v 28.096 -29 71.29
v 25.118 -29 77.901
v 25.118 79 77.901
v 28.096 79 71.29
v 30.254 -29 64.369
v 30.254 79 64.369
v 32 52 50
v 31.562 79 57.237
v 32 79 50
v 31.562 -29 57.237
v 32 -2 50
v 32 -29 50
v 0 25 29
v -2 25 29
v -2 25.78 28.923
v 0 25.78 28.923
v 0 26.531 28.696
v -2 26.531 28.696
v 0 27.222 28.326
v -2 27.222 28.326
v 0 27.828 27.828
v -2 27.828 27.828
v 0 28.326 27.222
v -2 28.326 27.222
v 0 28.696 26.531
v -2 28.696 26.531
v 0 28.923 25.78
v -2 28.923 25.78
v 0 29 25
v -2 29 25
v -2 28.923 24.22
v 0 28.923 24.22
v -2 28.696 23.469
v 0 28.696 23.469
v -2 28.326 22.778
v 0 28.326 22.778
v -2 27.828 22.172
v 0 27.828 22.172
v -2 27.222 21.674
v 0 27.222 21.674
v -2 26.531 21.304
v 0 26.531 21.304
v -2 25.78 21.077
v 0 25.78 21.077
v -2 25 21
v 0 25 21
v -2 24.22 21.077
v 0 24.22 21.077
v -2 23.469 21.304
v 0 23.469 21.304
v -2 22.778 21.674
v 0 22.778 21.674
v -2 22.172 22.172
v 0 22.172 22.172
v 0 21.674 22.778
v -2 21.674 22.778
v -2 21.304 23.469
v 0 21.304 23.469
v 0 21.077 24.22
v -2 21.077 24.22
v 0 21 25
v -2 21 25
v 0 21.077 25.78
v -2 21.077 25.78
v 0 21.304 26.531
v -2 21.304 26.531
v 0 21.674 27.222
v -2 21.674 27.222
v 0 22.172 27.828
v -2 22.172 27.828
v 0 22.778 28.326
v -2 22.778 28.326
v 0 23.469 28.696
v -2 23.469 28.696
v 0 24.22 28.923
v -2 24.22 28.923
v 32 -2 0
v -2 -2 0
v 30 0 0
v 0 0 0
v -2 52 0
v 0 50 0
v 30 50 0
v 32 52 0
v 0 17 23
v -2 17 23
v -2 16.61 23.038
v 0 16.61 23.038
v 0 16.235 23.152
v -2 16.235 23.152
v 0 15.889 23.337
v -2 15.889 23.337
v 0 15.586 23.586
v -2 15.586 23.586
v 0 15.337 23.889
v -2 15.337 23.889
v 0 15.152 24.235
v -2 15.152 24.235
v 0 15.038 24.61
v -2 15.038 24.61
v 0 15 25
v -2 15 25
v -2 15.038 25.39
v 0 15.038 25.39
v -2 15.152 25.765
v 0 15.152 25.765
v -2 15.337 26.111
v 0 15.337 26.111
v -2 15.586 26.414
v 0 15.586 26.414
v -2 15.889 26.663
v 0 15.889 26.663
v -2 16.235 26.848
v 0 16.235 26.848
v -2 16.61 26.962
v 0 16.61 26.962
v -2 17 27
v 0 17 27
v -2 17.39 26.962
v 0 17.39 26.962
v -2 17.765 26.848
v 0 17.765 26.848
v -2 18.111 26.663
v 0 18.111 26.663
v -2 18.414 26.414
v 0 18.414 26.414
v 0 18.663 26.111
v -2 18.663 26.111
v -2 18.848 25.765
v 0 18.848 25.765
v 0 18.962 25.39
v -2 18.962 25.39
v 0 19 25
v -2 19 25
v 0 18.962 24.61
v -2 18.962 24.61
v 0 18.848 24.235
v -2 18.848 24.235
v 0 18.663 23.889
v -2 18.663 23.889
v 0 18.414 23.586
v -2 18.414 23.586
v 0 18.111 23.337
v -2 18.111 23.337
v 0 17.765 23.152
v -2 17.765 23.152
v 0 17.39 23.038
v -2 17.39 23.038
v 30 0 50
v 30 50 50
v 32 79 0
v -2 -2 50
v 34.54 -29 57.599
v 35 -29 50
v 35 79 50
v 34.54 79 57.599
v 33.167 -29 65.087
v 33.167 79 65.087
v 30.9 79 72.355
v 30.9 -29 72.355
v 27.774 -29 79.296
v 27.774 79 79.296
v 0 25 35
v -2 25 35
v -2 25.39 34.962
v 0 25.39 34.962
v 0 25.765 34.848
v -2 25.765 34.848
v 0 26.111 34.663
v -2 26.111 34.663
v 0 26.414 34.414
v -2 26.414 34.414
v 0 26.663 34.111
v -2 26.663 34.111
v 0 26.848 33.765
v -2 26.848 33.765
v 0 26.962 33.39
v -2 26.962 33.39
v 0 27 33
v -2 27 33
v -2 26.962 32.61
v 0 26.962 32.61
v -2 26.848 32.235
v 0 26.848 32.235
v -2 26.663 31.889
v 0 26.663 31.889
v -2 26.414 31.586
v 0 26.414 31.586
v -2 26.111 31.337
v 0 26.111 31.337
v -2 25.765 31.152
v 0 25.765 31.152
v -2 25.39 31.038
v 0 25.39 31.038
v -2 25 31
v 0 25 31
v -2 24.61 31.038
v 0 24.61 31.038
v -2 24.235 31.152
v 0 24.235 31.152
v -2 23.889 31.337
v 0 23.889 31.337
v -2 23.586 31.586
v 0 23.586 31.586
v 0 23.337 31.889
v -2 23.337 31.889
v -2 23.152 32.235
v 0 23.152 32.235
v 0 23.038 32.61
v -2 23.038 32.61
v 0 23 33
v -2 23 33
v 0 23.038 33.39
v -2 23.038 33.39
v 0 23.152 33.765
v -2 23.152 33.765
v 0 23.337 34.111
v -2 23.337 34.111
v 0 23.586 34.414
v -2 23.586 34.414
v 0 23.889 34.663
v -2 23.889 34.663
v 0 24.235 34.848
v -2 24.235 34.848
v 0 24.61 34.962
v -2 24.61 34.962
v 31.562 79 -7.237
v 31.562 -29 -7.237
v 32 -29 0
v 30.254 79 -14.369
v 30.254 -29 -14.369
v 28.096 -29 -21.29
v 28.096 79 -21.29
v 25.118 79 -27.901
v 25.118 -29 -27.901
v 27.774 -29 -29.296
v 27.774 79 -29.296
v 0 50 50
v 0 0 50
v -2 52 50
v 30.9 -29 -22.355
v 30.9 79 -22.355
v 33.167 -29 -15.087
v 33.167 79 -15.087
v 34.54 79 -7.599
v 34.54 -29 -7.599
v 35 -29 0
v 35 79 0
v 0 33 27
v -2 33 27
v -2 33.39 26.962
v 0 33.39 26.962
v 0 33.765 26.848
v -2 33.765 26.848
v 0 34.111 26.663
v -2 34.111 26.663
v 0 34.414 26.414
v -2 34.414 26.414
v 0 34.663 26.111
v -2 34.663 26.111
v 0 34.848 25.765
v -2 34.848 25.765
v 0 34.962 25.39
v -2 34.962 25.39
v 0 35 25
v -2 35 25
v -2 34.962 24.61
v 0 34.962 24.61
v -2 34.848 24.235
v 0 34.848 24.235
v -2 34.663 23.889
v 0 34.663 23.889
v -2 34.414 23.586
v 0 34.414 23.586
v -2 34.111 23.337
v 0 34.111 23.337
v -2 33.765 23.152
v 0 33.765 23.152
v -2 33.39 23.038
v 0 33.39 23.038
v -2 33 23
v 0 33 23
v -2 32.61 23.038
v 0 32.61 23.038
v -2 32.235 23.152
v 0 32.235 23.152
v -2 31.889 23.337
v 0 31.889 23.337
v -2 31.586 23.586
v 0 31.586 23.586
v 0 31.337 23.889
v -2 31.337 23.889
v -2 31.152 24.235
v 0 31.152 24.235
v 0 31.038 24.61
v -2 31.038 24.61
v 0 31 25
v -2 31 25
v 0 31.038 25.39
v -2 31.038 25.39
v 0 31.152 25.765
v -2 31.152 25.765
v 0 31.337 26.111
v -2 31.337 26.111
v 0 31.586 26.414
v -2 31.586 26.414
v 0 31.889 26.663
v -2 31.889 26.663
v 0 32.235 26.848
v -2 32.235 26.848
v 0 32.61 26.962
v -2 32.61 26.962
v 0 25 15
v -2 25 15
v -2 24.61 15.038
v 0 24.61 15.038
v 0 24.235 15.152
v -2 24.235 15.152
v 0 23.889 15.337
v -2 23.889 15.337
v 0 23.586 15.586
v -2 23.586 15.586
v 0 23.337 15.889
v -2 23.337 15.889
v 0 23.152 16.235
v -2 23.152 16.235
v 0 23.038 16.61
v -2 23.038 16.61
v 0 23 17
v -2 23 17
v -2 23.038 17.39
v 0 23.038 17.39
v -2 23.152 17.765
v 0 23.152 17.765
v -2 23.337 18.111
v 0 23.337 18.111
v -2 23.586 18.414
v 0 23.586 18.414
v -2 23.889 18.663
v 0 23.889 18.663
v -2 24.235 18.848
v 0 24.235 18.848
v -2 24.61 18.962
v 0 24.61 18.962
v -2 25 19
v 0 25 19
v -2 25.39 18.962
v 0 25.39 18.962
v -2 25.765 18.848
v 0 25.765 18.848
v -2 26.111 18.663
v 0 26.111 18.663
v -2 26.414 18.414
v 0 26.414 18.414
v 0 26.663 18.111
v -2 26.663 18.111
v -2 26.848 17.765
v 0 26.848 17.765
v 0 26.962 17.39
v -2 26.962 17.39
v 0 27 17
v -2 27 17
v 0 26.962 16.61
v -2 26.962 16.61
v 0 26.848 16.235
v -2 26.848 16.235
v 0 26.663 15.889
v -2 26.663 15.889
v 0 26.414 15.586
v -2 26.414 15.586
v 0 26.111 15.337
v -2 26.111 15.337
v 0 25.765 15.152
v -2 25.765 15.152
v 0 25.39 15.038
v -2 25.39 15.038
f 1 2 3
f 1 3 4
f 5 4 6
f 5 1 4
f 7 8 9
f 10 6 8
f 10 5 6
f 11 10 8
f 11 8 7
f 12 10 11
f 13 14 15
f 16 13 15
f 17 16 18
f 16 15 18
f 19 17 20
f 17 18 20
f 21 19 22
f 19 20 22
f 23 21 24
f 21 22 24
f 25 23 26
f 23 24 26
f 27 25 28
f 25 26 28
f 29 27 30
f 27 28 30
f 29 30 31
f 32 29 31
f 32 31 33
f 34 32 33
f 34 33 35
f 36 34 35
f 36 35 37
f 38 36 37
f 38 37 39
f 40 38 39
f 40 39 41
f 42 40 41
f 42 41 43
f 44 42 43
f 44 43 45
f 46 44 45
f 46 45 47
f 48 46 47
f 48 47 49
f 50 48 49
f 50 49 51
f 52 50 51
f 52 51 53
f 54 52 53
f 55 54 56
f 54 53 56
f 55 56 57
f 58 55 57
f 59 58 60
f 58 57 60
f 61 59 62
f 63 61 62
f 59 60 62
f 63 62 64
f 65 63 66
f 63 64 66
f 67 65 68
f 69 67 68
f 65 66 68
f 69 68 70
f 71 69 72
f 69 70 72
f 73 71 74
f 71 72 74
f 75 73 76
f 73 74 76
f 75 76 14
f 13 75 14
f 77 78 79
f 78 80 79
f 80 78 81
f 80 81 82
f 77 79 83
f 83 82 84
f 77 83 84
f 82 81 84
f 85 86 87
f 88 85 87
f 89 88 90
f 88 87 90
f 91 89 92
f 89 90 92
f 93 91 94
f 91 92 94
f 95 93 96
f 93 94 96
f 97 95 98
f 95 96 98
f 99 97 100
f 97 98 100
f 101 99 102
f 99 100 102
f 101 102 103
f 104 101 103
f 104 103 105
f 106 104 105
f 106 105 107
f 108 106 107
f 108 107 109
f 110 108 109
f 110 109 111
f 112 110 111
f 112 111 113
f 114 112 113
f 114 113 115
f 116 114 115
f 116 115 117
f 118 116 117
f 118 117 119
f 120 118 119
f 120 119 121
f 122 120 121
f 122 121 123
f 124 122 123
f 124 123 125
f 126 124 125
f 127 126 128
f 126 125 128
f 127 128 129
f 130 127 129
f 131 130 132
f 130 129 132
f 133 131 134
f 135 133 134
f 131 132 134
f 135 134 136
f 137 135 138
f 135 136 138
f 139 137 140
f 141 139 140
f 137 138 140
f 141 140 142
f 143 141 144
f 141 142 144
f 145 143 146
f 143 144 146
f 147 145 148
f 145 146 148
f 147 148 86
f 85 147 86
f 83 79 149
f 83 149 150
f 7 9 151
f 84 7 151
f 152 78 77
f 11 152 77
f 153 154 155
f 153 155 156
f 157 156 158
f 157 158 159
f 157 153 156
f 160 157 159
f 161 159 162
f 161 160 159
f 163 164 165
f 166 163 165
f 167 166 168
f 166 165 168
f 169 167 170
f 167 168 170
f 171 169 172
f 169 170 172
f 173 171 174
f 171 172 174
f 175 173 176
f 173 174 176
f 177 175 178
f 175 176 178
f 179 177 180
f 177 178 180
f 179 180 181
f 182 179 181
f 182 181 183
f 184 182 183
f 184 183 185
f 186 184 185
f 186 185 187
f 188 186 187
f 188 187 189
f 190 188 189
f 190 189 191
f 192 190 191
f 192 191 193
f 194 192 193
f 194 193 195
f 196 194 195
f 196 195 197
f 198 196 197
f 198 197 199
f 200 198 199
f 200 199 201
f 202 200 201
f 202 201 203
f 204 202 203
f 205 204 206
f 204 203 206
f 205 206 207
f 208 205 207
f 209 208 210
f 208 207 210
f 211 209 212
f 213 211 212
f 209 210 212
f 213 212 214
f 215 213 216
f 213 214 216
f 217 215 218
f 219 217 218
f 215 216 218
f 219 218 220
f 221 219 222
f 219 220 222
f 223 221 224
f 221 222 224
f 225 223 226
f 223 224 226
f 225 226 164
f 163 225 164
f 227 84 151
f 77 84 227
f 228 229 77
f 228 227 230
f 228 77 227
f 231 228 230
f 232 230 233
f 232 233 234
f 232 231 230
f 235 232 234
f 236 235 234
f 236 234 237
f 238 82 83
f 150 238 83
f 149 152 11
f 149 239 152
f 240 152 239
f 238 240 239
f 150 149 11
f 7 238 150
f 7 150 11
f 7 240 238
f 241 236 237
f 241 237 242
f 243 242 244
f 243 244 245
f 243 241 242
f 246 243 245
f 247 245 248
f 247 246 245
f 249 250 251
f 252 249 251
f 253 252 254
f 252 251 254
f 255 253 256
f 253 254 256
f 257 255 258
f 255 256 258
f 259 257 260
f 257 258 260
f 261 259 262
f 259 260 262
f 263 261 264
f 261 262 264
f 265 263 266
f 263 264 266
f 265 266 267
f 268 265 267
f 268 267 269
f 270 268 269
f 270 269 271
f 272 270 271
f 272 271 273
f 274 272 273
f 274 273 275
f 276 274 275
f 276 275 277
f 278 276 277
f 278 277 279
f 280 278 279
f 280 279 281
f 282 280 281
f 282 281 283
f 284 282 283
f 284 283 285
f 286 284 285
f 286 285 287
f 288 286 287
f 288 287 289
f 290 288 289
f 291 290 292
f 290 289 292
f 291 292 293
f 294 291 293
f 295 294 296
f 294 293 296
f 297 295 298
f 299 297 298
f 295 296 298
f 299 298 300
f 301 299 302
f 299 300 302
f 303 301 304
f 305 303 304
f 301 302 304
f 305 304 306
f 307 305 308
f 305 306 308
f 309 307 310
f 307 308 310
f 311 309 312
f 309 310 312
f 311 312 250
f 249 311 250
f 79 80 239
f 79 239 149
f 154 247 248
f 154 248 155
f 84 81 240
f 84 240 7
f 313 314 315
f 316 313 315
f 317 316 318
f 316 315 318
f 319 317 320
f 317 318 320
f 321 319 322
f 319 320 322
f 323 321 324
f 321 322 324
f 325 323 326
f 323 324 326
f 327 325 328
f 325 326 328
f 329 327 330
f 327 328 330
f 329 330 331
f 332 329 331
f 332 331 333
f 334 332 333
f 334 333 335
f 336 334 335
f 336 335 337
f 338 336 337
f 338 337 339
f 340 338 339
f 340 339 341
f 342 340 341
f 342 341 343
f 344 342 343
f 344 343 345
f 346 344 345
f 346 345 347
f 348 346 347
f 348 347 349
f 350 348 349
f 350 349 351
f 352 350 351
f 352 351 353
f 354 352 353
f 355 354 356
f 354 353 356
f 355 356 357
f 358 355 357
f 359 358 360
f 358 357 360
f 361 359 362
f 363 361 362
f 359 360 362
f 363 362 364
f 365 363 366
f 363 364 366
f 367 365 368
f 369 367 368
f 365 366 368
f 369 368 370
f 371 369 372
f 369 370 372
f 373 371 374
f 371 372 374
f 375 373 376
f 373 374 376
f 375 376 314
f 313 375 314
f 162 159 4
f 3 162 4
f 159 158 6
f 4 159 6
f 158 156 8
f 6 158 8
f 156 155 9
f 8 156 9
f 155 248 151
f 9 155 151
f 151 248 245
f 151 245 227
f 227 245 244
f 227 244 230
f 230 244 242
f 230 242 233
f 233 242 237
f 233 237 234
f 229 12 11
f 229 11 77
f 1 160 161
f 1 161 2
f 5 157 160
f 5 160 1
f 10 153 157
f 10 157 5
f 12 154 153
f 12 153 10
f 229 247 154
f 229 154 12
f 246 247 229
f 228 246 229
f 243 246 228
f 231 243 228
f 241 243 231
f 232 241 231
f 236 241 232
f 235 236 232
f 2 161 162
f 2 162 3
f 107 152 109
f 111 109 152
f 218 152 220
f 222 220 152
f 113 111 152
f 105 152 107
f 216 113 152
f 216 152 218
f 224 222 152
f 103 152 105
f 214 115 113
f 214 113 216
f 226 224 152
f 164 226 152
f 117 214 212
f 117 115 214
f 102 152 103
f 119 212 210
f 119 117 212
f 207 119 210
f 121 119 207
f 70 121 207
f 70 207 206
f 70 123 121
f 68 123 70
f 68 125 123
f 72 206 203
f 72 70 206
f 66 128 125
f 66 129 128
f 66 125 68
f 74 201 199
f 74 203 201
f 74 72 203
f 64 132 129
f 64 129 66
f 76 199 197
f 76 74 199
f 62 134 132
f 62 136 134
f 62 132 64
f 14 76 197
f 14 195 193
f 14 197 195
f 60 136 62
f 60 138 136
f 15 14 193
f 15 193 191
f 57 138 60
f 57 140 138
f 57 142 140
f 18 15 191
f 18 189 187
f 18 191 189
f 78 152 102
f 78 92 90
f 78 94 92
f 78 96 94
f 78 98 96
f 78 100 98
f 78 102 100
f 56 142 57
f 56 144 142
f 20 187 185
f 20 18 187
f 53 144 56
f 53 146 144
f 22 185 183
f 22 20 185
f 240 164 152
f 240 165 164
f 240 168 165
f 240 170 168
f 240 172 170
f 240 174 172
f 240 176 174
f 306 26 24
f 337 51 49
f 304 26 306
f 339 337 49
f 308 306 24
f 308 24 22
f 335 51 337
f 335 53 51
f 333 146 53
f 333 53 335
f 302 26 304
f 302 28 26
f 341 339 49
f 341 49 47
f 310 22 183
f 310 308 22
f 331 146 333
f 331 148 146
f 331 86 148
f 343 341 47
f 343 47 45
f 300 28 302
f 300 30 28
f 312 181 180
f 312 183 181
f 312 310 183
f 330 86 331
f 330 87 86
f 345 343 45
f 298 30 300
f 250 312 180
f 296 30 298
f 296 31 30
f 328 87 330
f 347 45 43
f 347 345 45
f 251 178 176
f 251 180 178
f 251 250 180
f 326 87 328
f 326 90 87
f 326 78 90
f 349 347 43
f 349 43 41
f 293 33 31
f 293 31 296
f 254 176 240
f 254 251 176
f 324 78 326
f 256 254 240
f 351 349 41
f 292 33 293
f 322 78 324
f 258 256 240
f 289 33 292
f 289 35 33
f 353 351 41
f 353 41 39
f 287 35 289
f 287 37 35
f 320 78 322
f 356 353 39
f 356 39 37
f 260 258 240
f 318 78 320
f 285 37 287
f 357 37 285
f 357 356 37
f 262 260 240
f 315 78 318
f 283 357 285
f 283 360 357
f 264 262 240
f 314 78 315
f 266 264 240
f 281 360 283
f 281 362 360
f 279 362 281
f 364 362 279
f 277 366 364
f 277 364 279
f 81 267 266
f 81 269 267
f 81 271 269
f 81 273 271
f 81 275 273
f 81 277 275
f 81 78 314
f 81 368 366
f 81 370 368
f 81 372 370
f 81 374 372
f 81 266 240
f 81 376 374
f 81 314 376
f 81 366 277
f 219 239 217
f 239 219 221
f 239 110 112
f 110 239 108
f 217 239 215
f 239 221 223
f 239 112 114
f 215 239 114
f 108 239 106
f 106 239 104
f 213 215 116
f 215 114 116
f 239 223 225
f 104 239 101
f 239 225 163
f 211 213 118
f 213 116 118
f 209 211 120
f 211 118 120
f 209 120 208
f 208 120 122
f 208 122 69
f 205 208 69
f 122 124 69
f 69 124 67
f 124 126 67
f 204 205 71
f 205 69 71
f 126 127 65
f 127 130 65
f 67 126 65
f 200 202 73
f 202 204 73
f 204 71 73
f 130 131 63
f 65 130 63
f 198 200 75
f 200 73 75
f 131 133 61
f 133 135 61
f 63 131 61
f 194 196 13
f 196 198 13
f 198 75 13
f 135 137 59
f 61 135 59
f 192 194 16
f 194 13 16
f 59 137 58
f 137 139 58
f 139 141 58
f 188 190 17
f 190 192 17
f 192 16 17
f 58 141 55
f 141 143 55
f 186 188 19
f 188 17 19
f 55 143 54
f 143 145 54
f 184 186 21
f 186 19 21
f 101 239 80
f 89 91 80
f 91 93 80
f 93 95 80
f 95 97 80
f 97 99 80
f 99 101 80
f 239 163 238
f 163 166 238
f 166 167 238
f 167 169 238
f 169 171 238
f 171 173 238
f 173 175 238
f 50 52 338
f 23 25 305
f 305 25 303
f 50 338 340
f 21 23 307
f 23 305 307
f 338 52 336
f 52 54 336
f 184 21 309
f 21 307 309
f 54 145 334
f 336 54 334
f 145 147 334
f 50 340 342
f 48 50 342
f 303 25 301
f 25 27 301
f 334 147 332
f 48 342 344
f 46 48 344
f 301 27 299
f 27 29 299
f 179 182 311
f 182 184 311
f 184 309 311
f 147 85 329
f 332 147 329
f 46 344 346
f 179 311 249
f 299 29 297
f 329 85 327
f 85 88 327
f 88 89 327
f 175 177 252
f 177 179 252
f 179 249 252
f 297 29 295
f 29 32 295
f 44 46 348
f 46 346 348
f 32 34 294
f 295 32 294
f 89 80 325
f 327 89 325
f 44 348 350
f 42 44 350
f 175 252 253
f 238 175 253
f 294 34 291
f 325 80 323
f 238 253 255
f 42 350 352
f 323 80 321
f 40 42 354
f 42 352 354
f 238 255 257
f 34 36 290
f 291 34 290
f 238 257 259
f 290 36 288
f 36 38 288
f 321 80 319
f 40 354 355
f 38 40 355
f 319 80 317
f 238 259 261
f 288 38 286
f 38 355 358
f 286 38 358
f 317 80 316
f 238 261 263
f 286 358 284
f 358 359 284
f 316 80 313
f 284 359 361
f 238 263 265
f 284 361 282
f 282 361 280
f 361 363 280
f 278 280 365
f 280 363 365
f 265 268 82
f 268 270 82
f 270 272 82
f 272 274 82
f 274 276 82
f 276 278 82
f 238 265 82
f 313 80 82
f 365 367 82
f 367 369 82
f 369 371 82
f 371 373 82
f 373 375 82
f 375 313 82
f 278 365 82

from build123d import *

# Parameters (mm, degrees)
IZIM1_W               = 34
IZIM1_H               = 54
IZIM1_W_2             = 30
IZIM1_H_2             = 50
EKSTR_ZYON_NCE1_DEPTH = 50
KES_EKSTR_ZYON1_REACH = 81.75
IZIM2_R               = 4
IZIM2_R_2             = 2
EKSTR_ZYON_NCE2_DEPTH = 27


with BuildPart() as part:
    # Çizim1 → Ekstrüzyon-İnce1 (new body)
    with BuildSketch(Plane.XY):
        with Locations((15, 25)):
            Rectangle(IZIM1_W, IZIM1_H)
        with Locations((15, 25)):
            Rectangle(IZIM1_W_2, IZIM1_H_2, mode=Mode.SUBTRACT)
    extrude(amount=EKSTR_ZYON_NCE1_DEPTH)

    # Çizim2 → Kes-Ekstrüzyon1 (cut, up to next)
    with BuildSketch(Plane.ZY.offset(2), mode=Mode.PRIVATE) as kes_ekstr_zyon1_sk1:
        with Locations((25, 25)):
            Circle(IZIM2_R)
    kes_ekstr_zyon1_tool1 = extrude(kes_ekstr_zyon1_sk1.sketch, amount=-KES_EKSTR_ZYON1_REACH, mode=Mode.PRIVATE) & part.part
    # Çizim2 → Kes-Ekstrüzyon1 (cut, up to next)
    with BuildSketch(Plane.ZY.offset(2), mode=Mode.PRIVATE) as kes_ekstr_zyon1_sk2:
        with Locations((33, 25)):
            Circle(IZIM2_R_2)
    kes_ekstr_zyon1_tool2 = extrude(kes_ekstr_zyon1_sk2.sketch, amount=-KES_EKSTR_ZYON1_REACH, mode=Mode.PRIVATE) & part.part
    # Çizim2 → Kes-Ekstrüzyon1 (cut, up to next)
    with BuildSketch(Plane.ZY.offset(2), mode=Mode.PRIVATE) as kes_ekstr_zyon1_sk3:
        with Locations(Location((17, 25, 0), (0, 0, 180))):
            Circle(IZIM2_R_2)
    kes_ekstr_zyon1_tool3 = extrude(kes_ekstr_zyon1_sk3.sketch, amount=-KES_EKSTR_ZYON1_REACH, mode=Mode.PRIVATE) & part.part
    # Çizim2 → Kes-Ekstrüzyon1 (cut, up to next)
    with BuildSketch(Plane.ZY.offset(2), mode=Mode.PRIVATE) as kes_ekstr_zyon1_sk4:
        with Locations((25, 33)):
            Circle(IZIM2_R_2)
    kes_ekstr_zyon1_tool4 = extrude(kes_ekstr_zyon1_sk4.sketch, amount=-KES_EKSTR_ZYON1_REACH, mode=Mode.PRIVATE) & part.part
    # Çizim2 → Kes-Ekstrüzyon1 (cut, up to next)
    with BuildSketch(Plane.ZY.offset(2), mode=Mode.PRIVATE) as kes_ekstr_zyon1_sk5:
        with Locations(Location((25, 17, 0), (0, 0, 180))):
            Circle(IZIM2_R_2)
    kes_ekstr_zyon1_tool5 = extrude(kes_ekstr_zyon1_sk5.sketch, amount=-KES_EKSTR_ZYON1_REACH, mode=Mode.PRIVATE) & part.part
    add(kes_ekstr_zyon1_tool1.solids().sort_by_distance((-2, 25, 25))[0], mode=Mode.SUBTRACT)
    add(kes_ekstr_zyon1_tool2.solids().sort_by_distance((-2, 25, 33))[0], mode=Mode.SUBTRACT)
    add(kes_ekstr_zyon1_tool3.solids().sort_by_distance((-2, 25, 17))[0], mode=Mode.SUBTRACT)
    add(kes_ekstr_zyon1_tool4.solids().sort_by_distance((-2, 33, 25))[0], mode=Mode.SUBTRACT)
    add(kes_ekstr_zyon1_tool5.solids().sort_by_distance((-2, 17, 25))[0], mode=Mode.SUBTRACT)

    # Çizim3 → Ekstrüzyon-İnce2 (add, symmetric)
    with BuildSketch(Plane(origin=(0, 52, 0), x_dir=(1, 0, 0), z_dir=(0, 1, 0))):
        with BuildLine():
            ThreePointArc((25.118164338, -77.900907107), (30.254140884, -64.368544459), (32, -50))
            Line((32, -50), (32, 0))
            ThreePointArc((32, 0), (30.254140884, 14.368544459), (25.118164338, 27.900907107))
            Line((25.118164338, 27.900907107), (27.774072555, 29.295952462))
            ThreePointArc((27.774072555, 29.295952462), (33.166847928, 15.086971682), (35, 0))
            Line((35, 0), (35, -50))
            ThreePointArc((35, -50), (33.166847928, -65.086971682), (27.774072555, -79.295952462))
            Line((27.774072555, -79.295952462), (25.118164338, -77.900907107))
        make_face()
    ekstr_zyon_nce2 = extrude(amount=EKSTR_ZYON_NCE2_DEPTH, both=True)

    # Aynalama1: Ekstrüzyon-İnce2 across plane
    add(ekstr_zyon_nce2.mirror(Plane(origin=(-28, 25, 50), x_dir=(0, 0, 1), z_dir=(0, -1, 0))))


solid = part.part
